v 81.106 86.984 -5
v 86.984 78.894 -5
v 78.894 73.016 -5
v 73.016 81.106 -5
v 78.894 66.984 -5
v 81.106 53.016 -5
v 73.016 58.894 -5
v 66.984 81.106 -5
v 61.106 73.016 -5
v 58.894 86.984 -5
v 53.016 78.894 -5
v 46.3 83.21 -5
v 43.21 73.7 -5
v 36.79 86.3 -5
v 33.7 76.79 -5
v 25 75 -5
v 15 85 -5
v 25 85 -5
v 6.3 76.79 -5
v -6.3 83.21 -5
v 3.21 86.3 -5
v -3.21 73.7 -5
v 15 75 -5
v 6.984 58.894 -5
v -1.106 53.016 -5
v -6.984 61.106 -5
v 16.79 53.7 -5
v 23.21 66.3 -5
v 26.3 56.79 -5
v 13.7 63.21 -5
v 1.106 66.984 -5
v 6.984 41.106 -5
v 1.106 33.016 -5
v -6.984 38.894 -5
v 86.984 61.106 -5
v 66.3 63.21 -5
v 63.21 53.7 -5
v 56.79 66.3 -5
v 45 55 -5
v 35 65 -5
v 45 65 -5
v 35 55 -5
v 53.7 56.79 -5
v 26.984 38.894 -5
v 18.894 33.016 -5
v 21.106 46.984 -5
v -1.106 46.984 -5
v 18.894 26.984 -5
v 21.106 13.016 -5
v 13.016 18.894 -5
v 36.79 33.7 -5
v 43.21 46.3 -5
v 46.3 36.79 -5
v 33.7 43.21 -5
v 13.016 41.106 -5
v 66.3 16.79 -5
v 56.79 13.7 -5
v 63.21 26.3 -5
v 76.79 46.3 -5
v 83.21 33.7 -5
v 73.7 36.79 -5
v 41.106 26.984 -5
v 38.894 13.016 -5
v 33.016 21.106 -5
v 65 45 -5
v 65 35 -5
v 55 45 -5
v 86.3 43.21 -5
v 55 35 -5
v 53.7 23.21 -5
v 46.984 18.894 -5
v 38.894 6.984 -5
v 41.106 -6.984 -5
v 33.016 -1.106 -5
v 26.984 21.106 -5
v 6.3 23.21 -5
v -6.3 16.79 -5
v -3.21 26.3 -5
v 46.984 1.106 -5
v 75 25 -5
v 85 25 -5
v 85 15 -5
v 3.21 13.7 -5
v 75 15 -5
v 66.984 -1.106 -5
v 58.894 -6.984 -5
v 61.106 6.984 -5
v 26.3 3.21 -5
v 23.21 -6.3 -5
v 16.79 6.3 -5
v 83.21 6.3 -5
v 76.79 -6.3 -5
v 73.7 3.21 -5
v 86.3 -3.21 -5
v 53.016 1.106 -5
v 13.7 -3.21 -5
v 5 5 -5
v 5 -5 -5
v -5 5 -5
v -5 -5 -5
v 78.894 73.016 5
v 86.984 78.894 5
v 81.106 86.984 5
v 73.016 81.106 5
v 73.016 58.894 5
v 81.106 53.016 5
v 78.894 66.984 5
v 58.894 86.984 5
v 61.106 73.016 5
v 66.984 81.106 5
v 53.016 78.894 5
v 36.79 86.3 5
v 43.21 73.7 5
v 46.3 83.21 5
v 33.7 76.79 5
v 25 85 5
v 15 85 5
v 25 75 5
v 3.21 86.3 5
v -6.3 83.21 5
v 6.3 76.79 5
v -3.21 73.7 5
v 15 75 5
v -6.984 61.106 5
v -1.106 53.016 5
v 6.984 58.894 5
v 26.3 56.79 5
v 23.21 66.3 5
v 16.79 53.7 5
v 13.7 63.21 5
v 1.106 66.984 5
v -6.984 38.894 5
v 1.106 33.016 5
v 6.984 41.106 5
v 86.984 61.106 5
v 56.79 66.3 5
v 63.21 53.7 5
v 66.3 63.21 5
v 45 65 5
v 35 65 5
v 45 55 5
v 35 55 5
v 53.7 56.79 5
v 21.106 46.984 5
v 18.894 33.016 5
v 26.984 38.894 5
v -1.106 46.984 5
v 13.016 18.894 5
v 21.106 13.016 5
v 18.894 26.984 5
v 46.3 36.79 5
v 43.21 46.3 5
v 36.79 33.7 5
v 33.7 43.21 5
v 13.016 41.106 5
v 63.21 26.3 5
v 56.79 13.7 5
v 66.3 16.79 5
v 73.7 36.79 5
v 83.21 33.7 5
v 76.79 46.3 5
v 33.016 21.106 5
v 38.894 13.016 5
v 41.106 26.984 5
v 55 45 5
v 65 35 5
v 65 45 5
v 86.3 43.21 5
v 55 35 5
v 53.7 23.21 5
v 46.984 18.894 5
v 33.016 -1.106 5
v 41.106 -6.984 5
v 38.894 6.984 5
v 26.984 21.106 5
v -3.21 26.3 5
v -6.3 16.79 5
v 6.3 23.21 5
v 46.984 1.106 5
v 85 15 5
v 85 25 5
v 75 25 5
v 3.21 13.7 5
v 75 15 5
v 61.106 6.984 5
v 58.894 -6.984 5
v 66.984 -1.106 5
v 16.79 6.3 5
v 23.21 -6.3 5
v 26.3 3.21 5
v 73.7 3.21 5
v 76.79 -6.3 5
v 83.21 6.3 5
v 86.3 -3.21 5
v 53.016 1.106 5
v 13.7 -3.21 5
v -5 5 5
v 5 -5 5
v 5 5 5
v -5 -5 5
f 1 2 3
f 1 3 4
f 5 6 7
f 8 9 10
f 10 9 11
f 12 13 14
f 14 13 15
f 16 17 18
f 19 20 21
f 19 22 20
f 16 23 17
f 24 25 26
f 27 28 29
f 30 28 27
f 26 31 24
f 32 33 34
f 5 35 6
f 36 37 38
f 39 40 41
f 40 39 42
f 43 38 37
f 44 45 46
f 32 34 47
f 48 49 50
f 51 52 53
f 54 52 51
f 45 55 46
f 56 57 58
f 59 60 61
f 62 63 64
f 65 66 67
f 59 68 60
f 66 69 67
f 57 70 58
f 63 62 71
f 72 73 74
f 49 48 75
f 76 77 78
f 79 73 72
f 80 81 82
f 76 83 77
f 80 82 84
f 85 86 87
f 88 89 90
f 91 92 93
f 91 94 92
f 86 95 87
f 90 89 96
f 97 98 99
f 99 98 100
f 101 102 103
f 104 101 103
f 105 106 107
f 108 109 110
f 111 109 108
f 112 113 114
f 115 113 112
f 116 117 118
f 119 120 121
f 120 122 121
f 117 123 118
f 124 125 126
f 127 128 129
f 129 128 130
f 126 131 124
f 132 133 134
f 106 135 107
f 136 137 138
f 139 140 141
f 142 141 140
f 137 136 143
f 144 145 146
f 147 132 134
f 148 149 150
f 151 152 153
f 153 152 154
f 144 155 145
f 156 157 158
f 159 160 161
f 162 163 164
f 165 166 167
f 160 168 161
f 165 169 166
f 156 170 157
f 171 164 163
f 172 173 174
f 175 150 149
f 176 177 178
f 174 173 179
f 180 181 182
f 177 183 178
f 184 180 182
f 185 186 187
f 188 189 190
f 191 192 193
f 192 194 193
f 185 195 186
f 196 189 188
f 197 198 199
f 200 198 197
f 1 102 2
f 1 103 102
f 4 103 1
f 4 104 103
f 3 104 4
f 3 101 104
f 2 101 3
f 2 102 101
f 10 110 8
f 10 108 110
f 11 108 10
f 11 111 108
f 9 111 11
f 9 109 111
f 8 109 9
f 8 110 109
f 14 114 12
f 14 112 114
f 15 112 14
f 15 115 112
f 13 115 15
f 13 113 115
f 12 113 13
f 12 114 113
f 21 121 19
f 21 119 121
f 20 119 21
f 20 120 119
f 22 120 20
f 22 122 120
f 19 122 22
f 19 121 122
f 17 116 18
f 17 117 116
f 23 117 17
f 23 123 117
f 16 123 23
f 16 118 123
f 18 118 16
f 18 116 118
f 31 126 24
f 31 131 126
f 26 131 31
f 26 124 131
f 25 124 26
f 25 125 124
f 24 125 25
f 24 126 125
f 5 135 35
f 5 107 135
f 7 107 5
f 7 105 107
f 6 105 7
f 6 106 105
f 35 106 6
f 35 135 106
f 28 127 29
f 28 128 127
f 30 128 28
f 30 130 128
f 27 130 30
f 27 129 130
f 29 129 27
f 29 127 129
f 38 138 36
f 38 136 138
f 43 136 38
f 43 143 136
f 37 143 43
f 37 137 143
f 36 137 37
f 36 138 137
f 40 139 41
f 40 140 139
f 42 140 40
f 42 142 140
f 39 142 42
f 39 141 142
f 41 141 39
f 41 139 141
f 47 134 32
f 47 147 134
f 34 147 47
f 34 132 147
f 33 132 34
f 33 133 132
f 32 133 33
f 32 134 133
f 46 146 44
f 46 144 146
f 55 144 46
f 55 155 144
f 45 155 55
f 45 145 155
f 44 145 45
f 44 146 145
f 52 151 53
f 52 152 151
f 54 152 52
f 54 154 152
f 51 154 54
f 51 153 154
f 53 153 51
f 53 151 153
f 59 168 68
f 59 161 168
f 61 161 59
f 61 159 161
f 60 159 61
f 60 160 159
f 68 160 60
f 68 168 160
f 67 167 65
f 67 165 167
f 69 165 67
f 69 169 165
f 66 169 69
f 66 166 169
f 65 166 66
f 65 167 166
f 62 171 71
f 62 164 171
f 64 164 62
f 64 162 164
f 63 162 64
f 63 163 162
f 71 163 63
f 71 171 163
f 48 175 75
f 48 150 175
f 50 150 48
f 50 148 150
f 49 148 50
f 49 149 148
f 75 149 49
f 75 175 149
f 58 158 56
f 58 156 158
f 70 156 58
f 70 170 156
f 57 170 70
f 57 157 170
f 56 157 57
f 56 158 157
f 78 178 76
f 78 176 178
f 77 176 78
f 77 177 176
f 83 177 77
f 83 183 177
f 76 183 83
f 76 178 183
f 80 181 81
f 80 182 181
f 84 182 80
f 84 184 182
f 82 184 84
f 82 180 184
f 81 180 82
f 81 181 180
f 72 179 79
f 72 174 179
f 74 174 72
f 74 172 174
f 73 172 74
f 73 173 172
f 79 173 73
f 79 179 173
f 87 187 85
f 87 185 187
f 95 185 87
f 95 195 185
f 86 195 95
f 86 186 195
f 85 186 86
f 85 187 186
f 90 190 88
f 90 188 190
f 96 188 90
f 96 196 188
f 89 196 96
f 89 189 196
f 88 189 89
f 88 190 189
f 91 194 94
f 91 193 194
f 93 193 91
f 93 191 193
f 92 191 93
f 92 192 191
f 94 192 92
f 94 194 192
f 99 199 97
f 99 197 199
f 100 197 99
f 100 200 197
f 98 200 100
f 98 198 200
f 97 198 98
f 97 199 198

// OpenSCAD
// Erstellung eines komplexen geometrischen Musters
module geometricPattern(size, count) {
    for (i = [0 : count - 1]) {
        for (j = [0 : count - 1]) {
            angle = (i + j) * 360 / count;
            translate([i * size * 2, j * size * 2, 0])
                rotate([0, 0, angle])
                square(size, center = true);
        }
    }
}

linear_extrude(height = 10, center = true)
    geometricPattern(10, 5);// Erzeugt ein Muster mit 5x5 Quadraten, jedes 10 Einheiten groß
